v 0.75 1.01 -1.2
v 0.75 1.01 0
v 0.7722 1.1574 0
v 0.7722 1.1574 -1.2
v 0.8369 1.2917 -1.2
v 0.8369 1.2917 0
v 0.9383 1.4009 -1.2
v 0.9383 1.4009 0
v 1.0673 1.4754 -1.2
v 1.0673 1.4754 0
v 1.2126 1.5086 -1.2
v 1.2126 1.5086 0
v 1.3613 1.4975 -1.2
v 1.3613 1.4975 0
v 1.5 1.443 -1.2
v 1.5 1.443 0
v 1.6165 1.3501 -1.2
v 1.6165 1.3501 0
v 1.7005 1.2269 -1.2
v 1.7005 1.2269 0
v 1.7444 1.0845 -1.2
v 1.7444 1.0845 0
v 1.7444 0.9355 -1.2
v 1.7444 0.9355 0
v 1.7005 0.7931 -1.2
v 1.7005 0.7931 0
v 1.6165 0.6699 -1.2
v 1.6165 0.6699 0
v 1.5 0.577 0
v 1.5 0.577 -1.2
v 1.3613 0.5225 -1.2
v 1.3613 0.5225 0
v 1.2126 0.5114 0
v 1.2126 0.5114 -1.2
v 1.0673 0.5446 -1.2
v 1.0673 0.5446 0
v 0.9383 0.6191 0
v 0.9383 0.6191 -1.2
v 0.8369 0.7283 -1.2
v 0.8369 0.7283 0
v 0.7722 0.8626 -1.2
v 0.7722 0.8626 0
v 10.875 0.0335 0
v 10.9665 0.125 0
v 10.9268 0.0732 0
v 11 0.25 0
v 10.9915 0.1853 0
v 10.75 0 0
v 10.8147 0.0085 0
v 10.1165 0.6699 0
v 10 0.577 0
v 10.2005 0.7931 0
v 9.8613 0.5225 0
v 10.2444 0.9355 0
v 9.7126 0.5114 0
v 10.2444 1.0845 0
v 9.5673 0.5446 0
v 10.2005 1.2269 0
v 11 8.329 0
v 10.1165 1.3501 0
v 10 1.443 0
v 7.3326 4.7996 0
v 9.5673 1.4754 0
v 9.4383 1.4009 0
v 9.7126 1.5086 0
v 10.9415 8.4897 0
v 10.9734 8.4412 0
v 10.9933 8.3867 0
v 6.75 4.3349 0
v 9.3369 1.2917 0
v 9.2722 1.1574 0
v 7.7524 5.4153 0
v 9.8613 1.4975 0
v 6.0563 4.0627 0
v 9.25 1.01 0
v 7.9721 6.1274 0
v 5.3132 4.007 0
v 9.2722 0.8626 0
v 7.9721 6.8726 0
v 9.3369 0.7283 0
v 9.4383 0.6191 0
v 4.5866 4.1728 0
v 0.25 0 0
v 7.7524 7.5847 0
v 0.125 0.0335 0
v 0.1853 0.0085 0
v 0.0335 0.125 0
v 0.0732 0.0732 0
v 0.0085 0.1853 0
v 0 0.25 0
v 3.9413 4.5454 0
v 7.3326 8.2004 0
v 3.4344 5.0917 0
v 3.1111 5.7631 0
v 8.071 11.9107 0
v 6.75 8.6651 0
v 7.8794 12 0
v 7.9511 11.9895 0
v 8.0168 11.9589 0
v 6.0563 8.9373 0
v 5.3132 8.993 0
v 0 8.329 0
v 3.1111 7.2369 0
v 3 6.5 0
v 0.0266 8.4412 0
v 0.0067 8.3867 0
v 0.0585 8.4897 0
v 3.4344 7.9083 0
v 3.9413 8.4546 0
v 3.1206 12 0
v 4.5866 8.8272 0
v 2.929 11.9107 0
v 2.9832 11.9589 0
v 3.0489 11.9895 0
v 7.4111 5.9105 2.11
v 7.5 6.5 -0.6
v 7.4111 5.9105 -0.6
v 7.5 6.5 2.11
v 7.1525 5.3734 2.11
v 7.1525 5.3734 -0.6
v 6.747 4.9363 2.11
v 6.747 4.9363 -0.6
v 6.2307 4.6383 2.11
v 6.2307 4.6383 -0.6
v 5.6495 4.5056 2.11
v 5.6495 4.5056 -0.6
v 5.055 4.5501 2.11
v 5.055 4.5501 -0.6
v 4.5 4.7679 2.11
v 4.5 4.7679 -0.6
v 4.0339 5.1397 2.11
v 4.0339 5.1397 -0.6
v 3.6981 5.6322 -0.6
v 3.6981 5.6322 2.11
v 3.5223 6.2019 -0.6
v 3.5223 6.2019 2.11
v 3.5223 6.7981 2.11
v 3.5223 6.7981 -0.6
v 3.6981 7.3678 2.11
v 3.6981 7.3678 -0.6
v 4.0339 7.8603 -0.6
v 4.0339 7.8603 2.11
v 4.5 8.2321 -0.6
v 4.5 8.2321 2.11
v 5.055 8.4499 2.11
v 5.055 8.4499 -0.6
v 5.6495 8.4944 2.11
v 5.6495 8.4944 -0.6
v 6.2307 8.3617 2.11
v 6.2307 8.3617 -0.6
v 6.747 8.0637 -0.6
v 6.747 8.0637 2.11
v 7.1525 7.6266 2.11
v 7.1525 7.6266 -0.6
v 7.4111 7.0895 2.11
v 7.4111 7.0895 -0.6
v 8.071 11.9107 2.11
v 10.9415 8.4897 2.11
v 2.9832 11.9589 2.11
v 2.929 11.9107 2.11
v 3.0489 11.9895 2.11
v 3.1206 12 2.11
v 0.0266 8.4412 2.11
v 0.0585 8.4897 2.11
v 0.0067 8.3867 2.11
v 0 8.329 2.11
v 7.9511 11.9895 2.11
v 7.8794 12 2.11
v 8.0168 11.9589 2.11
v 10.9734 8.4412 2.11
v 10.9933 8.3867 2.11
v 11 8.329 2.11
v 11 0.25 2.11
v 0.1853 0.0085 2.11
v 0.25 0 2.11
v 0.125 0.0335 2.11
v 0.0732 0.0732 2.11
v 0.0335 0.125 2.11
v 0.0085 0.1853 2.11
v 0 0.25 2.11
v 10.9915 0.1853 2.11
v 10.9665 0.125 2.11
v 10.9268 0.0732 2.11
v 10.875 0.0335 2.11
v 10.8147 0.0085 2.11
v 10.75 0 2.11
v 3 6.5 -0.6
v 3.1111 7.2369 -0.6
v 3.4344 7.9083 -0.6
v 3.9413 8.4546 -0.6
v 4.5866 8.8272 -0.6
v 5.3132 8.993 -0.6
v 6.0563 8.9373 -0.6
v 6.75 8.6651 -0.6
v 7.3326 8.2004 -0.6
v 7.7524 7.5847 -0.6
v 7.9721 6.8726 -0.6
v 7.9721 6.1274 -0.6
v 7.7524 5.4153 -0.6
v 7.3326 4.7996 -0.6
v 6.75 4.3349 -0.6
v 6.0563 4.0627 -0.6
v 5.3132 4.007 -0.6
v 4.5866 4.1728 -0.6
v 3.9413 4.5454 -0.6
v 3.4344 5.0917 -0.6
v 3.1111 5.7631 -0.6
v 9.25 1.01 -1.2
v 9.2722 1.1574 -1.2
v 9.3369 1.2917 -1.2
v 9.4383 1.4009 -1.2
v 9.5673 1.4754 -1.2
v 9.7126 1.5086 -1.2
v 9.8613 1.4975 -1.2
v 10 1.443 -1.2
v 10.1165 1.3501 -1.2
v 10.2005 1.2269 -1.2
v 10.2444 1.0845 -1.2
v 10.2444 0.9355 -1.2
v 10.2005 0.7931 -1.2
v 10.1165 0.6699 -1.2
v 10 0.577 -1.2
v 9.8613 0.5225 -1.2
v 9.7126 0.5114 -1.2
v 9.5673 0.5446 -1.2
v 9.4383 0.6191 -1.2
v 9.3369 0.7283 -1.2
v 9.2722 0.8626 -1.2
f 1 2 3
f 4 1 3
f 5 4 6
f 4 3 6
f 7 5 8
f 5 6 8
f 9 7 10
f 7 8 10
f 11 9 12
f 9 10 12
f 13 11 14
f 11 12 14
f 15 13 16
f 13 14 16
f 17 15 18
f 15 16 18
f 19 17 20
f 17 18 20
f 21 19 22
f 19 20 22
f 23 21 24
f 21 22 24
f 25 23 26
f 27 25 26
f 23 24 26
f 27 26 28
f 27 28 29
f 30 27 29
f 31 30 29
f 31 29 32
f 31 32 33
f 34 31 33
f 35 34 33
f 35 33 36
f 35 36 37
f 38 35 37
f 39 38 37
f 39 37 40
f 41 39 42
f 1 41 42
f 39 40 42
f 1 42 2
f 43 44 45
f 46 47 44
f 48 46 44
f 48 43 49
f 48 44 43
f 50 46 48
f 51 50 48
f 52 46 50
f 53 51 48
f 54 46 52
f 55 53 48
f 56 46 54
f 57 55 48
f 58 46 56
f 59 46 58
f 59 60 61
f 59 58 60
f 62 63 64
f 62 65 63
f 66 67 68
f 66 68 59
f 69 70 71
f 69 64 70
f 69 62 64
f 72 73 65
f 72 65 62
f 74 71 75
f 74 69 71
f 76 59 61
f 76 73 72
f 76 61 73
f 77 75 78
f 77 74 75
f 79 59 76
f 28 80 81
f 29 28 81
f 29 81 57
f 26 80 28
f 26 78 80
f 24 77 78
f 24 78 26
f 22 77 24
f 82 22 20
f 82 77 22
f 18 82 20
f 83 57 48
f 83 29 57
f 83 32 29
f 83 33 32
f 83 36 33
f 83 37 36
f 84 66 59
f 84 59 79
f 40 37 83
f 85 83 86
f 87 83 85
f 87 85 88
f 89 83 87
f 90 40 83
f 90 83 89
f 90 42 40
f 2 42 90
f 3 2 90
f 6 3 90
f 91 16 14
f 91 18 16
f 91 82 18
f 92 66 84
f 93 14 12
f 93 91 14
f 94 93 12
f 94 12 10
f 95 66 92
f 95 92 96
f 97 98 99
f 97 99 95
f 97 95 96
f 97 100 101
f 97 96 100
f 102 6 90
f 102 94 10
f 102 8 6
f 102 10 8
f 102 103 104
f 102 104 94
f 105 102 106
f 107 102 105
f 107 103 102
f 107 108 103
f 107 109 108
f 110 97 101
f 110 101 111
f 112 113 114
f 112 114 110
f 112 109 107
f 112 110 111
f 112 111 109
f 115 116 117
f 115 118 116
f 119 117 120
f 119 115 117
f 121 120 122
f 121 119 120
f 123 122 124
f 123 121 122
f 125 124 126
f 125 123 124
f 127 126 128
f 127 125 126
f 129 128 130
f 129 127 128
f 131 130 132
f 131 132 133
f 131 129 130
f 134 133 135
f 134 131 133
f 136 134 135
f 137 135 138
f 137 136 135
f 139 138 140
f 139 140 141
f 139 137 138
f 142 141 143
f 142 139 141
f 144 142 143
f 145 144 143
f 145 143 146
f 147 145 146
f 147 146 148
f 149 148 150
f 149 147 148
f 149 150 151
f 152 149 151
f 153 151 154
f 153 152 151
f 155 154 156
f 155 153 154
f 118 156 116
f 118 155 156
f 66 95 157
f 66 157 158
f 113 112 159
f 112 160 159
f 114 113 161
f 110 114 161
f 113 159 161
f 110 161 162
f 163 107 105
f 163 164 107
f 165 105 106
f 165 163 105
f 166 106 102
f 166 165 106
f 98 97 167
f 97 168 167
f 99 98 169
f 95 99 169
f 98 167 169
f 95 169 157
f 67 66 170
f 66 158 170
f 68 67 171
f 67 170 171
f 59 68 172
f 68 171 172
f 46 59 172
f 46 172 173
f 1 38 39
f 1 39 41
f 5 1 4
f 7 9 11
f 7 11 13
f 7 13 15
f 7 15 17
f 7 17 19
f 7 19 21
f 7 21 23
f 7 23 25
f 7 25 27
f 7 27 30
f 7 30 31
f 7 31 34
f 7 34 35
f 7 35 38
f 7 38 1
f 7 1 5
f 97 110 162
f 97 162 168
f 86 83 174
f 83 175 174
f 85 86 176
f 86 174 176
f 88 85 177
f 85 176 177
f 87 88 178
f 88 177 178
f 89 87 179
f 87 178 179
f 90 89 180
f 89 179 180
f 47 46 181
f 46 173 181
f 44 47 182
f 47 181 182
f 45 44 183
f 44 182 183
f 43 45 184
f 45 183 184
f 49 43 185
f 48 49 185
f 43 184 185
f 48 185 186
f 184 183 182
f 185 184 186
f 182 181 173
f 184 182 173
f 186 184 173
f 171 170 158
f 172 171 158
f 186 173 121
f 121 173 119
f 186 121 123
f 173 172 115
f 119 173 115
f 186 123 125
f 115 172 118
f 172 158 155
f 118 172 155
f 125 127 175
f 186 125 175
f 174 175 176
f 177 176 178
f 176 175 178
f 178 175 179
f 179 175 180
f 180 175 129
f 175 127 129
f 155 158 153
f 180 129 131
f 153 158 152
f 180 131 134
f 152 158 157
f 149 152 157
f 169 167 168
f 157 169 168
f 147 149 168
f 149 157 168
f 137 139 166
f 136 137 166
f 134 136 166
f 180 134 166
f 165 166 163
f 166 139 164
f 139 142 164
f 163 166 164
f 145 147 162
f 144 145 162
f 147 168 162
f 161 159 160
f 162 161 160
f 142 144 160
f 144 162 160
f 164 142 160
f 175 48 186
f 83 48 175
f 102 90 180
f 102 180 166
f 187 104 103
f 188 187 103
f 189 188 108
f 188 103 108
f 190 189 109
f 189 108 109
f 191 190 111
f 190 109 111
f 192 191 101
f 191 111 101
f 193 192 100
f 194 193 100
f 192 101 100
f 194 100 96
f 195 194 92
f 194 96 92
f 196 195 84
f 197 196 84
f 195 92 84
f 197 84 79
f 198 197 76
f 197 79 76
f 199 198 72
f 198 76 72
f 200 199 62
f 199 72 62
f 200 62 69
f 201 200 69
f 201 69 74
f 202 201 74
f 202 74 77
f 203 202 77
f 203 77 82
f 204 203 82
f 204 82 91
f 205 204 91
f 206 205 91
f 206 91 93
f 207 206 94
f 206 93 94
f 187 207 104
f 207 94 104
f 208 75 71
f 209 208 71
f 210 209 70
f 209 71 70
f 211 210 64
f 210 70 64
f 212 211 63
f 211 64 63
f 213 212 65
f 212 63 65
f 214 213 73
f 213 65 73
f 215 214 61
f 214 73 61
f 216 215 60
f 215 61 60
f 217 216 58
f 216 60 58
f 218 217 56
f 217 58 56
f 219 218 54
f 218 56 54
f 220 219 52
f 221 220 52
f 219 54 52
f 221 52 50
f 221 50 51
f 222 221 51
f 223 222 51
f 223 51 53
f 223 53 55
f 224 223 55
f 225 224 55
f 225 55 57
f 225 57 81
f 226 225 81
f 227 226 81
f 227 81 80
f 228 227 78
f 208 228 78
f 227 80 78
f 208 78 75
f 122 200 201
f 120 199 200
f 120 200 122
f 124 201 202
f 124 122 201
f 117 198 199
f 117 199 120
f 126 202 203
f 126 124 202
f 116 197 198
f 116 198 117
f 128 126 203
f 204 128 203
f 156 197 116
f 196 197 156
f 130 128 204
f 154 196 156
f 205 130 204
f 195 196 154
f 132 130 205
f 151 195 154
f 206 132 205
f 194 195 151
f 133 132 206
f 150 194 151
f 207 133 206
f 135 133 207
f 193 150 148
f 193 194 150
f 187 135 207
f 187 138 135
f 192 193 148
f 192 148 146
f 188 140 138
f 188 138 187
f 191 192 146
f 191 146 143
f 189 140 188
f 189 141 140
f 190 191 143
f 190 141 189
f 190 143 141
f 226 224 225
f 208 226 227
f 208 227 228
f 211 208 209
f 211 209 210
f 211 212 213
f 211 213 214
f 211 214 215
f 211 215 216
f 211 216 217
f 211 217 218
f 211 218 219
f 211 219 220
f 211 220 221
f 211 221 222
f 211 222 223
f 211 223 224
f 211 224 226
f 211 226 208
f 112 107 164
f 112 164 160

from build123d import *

# Parameters (mm, degrees)
EXTRUSION1_DEPTH = 2.11
CONG_1_R         = 0.25
ESQUISSE2_R      = 2
EXTRUSION2_DEPTH = 17.414996193
ESQUISSE3_R      = 2.5
ESQUISSE3_R_2    = 2
EXTRUSION3_DEPTH = 0.6
ESQUISSE4_R      = 0.5
EXTRUSION4_DEPTH = 1.2


with BuildPart() as part:
    # Esquisse1 → Extrusion1 (new body)
    with BuildSketch(Plane.XY):
        Polygon((0, 8.42), (3.00397668, 12), (7.99602332, 12), (11, 8.42), (11, 0), (0, 0), align=None)
    extrude(amount=EXTRUSION1_DEPTH)

    # Congé1
    cong_1_edges = [part.edges().sort_by_distance(p)[0] for p in [
        (0, 8.42, 1.055),
        (3.00397668, 12, 1.055),
        (7.99602332, 12, 1.055),
        (11, 8.42, 1.055),
        (11, 0, 1.055),
        (0, 0, 1.055),
    ]]
    fillet(cong_1_edges, radius=CONG_1_R)

    # Esquisse2 → Extrusion2 (cut, through all)
    with BuildSketch(Plane.XY.offset(2.11)):
        with Locations((5.5, 6.5)):
            Circle(ESQUISSE2_R)
    extrude(amount=-EXTRUSION2_DEPTH, mode=Mode.SUBTRACT)

    # Esquisse3 → Extrusion3 (add)
    with BuildSketch(Plane(origin=(0, 0, 0), x_dir=(-1, 0, 0), z_dir=(0, 0, -1))):
        with Locations((-5.5, 6.5)):
            Circle(ESQUISSE3_R)
        with Locations(Location((-5.5, 6.5, 0), (0, 0, 180))):
            Circle(ESQUISSE3_R_2, mode=Mode.SUBTRACT)
    extrude(amount=EXTRUSION3_DEPTH)

    # Esquisse4 → Extrusion4 (add)
    with BuildSketch(Plane(origin=(0, 0, 0), x_dir=(-1, 0, 0), z_dir=(0, 0, -1))):
        with Locations((-9.75, 1.01)):
            Circle(ESQUISSE4_R)
        with Locations((-1.25, 1.01)):
            Circle(ESQUISSE4_R)
    extrude(amount=EXTRUSION4_DEPTH)


solid = part.part
